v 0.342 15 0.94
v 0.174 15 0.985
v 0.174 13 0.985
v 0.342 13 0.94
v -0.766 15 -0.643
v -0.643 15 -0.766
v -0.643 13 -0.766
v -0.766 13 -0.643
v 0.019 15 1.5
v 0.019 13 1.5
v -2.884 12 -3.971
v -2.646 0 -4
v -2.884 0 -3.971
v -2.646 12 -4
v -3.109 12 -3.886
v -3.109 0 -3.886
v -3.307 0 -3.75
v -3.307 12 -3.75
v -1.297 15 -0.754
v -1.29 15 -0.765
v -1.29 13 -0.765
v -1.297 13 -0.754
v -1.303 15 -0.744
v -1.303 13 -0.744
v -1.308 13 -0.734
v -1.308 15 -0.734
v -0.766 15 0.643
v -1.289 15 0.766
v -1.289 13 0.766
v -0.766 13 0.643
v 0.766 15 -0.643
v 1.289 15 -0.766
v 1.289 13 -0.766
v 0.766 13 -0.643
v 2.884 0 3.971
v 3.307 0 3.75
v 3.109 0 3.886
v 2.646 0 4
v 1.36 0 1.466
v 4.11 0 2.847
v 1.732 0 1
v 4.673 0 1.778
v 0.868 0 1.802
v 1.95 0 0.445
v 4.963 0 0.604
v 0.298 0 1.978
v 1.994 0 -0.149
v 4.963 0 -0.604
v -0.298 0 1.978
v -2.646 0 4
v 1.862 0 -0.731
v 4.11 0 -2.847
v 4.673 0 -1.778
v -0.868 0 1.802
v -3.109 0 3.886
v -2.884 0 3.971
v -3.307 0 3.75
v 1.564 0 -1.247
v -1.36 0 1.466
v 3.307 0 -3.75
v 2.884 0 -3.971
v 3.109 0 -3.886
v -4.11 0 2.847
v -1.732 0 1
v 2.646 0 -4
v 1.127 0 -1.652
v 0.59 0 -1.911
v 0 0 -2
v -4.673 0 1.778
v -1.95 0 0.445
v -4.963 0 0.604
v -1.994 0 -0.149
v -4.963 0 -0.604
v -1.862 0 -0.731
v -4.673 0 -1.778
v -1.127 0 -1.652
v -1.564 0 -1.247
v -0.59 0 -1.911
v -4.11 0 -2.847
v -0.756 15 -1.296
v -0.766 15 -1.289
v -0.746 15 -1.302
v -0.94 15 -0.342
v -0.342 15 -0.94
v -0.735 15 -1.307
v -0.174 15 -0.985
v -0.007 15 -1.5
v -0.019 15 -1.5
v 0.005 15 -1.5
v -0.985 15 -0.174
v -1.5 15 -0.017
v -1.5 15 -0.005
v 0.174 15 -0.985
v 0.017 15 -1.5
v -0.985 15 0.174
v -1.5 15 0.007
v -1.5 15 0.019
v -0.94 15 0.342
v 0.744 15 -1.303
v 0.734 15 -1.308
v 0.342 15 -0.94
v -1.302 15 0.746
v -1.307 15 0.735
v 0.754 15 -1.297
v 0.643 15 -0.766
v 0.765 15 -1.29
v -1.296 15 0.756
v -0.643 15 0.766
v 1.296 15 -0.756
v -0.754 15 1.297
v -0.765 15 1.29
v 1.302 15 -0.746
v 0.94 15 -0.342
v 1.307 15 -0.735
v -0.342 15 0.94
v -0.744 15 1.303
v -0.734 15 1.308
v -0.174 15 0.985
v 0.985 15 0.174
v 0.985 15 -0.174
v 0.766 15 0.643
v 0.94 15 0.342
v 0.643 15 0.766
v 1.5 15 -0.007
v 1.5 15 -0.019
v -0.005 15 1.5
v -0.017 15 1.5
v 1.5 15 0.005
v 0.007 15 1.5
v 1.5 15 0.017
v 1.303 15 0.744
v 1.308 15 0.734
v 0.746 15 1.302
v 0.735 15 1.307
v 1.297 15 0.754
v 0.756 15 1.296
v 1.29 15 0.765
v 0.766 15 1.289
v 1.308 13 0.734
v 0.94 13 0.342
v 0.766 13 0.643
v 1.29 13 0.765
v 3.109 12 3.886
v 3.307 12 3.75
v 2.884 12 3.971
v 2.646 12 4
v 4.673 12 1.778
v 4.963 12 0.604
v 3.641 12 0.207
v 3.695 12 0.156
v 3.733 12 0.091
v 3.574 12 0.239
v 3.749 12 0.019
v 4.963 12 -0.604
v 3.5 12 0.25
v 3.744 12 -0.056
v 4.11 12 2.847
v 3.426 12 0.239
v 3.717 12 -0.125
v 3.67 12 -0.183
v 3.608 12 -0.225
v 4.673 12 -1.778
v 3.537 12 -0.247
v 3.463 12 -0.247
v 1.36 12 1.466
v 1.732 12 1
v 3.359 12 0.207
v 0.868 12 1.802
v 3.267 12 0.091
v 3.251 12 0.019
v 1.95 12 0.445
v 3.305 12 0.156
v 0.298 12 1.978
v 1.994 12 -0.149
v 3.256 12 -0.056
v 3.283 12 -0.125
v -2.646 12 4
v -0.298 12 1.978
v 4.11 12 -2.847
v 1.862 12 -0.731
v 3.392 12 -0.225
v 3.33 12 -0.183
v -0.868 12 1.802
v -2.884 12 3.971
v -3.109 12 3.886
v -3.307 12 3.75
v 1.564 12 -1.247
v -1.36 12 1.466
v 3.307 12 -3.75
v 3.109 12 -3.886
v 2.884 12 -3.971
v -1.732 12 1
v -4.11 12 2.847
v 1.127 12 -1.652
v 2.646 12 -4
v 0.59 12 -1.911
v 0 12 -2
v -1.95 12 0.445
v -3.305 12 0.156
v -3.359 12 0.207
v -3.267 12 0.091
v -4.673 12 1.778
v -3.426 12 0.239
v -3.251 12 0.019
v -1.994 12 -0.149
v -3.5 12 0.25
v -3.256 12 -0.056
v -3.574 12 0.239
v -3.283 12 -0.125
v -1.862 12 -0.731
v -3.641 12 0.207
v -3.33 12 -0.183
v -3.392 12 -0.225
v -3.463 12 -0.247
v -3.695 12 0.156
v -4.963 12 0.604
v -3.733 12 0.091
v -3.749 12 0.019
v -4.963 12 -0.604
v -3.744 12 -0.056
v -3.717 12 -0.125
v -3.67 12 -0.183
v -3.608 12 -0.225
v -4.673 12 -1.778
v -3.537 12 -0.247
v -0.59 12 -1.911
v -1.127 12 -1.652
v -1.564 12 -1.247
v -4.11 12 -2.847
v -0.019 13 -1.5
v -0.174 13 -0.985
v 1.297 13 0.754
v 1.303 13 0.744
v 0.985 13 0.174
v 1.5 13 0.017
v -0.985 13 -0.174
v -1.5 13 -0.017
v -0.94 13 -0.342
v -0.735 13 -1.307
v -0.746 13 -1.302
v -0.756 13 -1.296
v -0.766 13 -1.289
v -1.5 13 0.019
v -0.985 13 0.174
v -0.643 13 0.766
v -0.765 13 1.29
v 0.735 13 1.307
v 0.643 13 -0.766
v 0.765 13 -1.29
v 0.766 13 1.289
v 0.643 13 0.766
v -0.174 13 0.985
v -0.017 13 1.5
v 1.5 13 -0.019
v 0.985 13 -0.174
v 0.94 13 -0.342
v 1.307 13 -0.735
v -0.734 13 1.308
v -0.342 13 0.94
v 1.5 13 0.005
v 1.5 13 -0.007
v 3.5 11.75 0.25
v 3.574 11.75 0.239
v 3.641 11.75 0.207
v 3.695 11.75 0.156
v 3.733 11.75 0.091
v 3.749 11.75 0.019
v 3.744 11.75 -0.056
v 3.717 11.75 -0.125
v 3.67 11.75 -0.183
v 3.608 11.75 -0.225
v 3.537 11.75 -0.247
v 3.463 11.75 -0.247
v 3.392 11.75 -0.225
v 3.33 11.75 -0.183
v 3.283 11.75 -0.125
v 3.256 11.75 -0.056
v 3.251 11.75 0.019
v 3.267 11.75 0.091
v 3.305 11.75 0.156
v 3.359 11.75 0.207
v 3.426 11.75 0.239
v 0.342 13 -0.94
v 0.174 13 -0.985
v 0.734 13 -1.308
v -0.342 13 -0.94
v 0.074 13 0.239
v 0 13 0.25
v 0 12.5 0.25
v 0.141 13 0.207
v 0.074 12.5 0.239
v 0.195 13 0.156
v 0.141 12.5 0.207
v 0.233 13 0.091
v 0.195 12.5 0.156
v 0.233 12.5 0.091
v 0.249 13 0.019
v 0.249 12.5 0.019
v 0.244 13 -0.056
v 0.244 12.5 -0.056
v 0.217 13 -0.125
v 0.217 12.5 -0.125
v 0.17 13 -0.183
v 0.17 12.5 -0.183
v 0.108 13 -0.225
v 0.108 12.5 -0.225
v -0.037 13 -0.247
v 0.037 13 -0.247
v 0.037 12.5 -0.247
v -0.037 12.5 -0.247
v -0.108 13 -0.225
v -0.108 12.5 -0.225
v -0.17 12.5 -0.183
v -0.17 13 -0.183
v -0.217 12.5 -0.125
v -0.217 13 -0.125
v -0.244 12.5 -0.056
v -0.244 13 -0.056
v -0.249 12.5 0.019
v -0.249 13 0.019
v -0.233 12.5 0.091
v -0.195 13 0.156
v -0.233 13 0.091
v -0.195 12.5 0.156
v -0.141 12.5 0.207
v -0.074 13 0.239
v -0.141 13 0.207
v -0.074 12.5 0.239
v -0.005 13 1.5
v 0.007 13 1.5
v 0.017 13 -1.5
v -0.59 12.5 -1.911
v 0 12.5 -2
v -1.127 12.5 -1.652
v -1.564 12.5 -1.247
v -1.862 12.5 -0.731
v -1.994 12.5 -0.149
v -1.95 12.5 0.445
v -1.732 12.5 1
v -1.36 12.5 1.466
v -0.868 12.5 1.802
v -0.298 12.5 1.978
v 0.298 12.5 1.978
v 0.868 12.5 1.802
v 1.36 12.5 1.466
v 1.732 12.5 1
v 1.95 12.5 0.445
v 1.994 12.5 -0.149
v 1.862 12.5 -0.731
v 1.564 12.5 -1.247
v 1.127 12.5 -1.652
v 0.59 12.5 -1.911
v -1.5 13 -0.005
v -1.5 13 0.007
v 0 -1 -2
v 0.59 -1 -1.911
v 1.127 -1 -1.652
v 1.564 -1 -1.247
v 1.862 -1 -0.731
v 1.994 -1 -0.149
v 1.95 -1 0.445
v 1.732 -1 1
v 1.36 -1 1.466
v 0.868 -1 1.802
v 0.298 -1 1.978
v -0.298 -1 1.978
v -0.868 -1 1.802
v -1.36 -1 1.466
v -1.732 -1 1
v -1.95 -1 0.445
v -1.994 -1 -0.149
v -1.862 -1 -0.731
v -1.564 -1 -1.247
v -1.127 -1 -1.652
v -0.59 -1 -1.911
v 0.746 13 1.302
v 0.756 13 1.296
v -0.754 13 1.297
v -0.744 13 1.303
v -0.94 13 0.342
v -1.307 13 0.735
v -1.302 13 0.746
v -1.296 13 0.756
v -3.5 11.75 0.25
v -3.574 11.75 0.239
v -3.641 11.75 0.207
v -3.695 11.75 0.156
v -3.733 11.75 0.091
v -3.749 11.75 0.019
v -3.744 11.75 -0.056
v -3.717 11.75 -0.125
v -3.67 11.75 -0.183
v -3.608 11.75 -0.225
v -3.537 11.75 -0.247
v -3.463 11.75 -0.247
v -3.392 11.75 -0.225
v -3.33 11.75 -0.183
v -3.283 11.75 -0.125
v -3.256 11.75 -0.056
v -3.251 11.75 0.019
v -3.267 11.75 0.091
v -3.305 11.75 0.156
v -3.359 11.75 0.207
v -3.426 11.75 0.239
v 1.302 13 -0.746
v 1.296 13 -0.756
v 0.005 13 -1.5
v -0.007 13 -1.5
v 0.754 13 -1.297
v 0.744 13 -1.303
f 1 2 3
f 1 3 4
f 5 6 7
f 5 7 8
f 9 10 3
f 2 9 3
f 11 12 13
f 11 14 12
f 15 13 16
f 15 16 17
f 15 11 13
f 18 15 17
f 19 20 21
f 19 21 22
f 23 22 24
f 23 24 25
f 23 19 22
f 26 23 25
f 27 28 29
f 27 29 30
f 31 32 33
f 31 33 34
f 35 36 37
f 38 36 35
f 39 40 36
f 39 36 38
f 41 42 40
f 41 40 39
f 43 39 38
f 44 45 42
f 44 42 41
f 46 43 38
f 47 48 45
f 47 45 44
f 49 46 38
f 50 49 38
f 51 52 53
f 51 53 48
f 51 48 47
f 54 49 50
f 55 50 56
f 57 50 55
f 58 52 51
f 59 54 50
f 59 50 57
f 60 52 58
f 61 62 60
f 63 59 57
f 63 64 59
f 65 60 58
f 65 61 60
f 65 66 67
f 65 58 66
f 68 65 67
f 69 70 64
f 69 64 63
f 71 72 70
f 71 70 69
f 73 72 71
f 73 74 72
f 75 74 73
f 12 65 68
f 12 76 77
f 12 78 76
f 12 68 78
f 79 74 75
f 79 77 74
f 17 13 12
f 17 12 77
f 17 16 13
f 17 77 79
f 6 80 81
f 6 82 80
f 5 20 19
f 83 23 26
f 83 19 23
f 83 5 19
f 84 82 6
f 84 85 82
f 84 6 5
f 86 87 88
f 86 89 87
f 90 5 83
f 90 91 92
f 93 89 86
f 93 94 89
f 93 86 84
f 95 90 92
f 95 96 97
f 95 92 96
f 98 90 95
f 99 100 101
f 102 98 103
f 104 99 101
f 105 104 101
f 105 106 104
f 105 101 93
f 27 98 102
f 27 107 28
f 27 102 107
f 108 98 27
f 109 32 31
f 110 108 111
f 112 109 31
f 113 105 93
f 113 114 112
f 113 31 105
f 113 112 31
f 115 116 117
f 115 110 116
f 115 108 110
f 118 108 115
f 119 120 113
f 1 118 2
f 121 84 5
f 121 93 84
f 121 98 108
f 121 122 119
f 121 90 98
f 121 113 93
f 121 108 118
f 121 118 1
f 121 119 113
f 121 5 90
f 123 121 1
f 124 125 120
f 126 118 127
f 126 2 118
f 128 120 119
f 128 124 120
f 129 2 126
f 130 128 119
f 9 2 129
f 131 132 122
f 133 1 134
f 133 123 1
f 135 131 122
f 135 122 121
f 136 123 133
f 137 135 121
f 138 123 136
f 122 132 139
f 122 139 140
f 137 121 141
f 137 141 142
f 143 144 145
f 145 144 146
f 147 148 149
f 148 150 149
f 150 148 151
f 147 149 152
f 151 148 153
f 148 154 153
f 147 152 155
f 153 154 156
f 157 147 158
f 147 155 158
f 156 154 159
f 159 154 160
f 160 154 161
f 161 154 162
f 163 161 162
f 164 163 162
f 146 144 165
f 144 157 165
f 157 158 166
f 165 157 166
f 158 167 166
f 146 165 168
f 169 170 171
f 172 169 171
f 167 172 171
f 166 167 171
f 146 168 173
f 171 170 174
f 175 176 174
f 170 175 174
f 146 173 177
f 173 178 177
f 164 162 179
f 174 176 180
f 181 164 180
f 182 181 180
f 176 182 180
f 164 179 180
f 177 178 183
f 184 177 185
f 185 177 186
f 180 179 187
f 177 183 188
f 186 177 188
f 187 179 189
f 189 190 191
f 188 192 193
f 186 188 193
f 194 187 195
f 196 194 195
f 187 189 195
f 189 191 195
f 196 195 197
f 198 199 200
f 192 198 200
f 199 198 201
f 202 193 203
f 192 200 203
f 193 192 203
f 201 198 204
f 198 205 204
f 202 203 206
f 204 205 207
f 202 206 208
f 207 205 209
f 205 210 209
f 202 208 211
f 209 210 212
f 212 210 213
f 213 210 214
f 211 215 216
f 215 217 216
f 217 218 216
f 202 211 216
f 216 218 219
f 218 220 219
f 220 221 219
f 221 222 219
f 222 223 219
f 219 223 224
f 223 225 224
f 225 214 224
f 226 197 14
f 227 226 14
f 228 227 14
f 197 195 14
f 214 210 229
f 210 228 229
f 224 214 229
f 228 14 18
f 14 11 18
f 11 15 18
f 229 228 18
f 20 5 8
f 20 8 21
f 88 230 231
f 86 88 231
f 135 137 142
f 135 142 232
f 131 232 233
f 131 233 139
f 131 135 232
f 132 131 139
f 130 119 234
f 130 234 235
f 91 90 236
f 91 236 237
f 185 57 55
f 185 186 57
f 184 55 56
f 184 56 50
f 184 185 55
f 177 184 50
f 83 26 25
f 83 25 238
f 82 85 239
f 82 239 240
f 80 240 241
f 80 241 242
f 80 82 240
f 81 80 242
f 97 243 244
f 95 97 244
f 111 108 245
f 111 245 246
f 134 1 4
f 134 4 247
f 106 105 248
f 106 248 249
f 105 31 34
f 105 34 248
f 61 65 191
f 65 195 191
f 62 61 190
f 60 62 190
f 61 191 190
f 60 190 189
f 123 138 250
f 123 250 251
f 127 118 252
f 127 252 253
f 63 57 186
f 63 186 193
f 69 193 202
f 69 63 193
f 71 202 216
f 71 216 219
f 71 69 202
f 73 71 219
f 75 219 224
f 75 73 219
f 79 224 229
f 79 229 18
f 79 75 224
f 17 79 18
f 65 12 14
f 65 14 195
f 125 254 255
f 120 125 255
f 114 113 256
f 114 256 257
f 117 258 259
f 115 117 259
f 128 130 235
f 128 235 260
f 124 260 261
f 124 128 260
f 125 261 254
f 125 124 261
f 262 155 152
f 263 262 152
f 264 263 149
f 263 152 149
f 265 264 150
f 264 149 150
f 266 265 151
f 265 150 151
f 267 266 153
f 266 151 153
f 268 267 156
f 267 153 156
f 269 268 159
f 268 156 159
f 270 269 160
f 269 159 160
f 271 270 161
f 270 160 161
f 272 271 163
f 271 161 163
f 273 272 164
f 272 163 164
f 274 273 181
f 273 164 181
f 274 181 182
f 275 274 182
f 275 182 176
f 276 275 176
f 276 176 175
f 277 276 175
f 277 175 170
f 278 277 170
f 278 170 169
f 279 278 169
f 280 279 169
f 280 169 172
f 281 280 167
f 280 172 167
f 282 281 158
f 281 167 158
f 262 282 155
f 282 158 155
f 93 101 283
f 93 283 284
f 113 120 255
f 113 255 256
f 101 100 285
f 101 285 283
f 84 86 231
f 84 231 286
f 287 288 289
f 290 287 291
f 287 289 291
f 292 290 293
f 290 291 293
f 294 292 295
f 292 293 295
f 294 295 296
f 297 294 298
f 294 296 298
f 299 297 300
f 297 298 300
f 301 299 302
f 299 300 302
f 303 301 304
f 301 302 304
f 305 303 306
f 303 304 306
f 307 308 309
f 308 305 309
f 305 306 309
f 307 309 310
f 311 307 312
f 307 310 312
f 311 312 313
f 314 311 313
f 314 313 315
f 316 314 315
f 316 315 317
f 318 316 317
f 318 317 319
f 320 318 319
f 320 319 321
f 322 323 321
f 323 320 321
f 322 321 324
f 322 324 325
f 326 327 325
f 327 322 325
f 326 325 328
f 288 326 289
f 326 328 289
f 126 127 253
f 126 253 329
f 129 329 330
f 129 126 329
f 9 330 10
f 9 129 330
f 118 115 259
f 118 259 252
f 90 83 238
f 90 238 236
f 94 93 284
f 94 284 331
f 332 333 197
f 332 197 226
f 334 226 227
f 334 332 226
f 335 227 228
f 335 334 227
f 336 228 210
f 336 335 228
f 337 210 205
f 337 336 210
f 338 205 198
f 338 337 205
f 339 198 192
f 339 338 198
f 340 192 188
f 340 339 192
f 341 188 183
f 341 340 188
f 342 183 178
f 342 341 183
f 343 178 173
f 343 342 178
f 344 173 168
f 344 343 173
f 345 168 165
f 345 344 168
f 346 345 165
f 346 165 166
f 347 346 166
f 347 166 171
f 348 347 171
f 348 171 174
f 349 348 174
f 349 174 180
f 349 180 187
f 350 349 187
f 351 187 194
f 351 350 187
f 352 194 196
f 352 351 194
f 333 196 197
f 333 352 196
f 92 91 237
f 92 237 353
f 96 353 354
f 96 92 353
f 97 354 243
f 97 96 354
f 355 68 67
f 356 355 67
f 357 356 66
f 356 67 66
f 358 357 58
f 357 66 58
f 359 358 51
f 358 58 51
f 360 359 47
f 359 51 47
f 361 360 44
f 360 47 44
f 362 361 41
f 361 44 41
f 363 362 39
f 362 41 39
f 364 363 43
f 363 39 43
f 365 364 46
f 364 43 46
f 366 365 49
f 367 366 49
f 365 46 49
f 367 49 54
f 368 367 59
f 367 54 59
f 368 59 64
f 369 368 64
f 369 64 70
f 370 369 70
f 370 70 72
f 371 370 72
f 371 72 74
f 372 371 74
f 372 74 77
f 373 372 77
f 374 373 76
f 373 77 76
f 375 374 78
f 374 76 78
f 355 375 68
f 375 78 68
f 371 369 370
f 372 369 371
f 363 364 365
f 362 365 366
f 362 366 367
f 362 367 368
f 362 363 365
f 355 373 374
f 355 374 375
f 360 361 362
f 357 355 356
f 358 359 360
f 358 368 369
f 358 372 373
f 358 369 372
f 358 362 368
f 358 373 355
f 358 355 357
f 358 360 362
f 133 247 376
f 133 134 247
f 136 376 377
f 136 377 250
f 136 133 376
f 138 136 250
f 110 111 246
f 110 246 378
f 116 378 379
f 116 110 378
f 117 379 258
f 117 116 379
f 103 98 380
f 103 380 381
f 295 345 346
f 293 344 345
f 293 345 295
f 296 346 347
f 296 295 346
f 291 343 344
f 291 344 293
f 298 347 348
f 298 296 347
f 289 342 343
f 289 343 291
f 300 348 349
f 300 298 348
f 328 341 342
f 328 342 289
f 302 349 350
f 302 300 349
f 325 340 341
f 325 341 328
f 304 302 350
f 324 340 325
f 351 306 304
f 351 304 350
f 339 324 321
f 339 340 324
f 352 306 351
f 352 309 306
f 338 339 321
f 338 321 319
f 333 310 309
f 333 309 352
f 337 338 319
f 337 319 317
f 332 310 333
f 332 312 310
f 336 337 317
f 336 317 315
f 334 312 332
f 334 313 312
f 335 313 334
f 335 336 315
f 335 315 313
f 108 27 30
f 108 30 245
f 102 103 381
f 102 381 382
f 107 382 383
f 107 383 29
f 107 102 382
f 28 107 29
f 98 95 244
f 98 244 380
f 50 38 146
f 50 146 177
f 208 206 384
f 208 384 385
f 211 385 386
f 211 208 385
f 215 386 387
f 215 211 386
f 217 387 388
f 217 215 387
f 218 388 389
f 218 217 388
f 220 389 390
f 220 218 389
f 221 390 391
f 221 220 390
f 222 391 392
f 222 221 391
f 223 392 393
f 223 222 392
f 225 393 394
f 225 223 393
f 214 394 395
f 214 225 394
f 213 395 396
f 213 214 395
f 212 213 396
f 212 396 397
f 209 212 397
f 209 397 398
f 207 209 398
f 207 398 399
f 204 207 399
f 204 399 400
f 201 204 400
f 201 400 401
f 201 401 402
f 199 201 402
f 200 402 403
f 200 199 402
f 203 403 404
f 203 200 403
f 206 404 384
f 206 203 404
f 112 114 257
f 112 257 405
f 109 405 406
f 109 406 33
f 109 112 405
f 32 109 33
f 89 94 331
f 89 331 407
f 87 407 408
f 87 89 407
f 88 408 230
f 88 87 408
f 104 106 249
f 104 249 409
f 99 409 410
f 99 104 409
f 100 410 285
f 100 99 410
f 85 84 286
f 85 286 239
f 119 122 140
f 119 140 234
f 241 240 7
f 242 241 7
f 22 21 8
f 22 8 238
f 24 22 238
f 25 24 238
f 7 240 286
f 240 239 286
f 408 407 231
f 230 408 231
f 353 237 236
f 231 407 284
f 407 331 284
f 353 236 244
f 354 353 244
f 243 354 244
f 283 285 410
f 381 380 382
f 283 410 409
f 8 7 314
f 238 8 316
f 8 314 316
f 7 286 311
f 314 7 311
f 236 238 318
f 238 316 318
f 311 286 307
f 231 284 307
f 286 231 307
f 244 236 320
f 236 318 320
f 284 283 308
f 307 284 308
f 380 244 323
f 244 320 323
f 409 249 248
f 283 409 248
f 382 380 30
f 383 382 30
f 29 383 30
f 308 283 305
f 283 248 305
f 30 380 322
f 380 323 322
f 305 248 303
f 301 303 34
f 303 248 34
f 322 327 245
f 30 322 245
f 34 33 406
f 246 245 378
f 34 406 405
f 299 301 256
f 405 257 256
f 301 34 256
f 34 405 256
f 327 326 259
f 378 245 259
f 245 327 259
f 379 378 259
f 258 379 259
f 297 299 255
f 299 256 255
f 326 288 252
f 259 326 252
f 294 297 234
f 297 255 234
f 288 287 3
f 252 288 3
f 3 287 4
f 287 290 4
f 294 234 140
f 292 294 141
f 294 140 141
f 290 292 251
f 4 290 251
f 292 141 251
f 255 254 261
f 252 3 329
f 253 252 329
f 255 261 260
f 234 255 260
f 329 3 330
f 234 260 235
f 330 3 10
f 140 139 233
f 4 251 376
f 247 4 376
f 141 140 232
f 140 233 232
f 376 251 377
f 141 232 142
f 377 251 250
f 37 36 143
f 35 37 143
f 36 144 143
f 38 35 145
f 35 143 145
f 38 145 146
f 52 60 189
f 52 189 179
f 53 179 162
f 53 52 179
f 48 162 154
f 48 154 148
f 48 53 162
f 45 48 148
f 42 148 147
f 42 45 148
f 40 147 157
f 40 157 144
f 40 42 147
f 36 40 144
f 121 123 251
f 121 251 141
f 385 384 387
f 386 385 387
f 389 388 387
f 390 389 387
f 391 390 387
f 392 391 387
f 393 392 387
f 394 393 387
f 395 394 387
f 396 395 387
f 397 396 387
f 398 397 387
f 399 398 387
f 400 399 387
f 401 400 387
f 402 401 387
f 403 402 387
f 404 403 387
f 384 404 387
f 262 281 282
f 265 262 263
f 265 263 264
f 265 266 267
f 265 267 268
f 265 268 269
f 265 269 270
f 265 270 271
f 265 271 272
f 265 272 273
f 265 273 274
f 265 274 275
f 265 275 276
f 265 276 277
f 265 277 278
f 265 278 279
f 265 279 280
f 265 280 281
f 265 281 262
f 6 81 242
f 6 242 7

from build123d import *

# Parameters (mm, degrees)
BOSS_EXTRUDE1_DEPTH = 12
SKETCH3_R           = 2
BOSS_EXTRUDE2_DEPTH = 1
FILLET3_R           = 1
BOSS_EXTRUDE3_START = 0.5
SKETCH4_R           = 2
BOSS_EXTRUDE3_DEPTH = 0.5
SKETCH5_R           = 0.25
CUT_EXTRUDE1_DEPTH  = 0.25
SKETCH6_R           = 0.25
BOSS_EXTRUDE4_DEPTH = 2.5
SKETCH7_R           = 1.5
BOSS_EXTRUDE5_DEPTH = 2
CUT_EXTRUDE11_DEPTH = 2
CIRPATTERN2_COUNT   = 12


with BuildPart() as part:
    # Sketch2 → Boss-Extrude1 (new body)
    with BuildSketch(Plane(origin=(0, 0, 0), x_dir=(1, 0, 0), z_dir=(0, 1, 0))):
        with BuildLine():
            Line((-3, 4), (3, 4))
            ThreePointArc((3, 4), (5, 0), (3, -4))
            Line((3, -4), (-3, -4))
            ThreePointArc((-3, -4), (-5, 0), (-3, 4))
        make_face()
    extrude(amount=BOSS_EXTRUDE1_DEPTH)

    # Sketch3 → Boss-Extrude2 (add)
    with BuildSketch(Plane(origin=(0, 0, 0), x_dir=(-1, 0, 0), z_dir=(0, -1, 0))):
        with Locations(Location((0, 0, 0), (0, 0, 90))):
            Circle(SKETCH3_R)
    extrude(amount=BOSS_EXTRUDE2_DEPTH)

    # Fillet3
    fillet3_edges = [part.edges().sort_by_distance(p)[0] for p in [
        (-3, 6, -4),
        (3, 6, -4),
        (3, 6, 4),
        (-3, 6, 4),
    ]]
    fillet(fillet3_edges, radius=FILLET3_R)

    # Sketch4 → Boss-Extrude3 (add)
    with BuildSketch(Plane(origin=(0, 12, 0), x_dir=(1, 0, 0), z_dir=(0, 1, 0)).offset(BOSS_EXTRUDE3_START)):
        with Locations(Location((0, 0, 0), (0, 0, 90))):
            Circle(SKETCH4_R)
    extrude(amount=-BOSS_EXTRUDE3_DEPTH)

    # Sketch5 → Cut-Extrude1 (cut)
    with BuildSketch(Plane(origin=(0, 12, 0), x_dir=(1, 0, 0), z_dir=(0, 1, 0))):
        with Locations(Location((3.5, 0, 0), (0, 0, 270))):
            Circle(SKETCH5_R)
    cut_extrude1 = extrude(amount=-CUT_EXTRUDE1_DEPTH, mode=Mode.SUBTRACT)

    # Mirror1: Cut-Extrude1 across plane
    add(cut_extrude1.mirror(Plane(origin=(0, 0, 0), x_dir=(0, 0, 1), z_dir=(1, 0, 0))), mode=Mode.SUBTRACT)

    # Sketch6 → Boss-Extrude4 (add)
    with BuildSketch(Plane(origin=(0, 12.5, 0), x_dir=(1, 0, 0), z_dir=(0, 1, 0))):
        with Locations(Location((0, 0, 0), (0, 0, 270))):
            Circle(SKETCH6_R)
    extrude(amount=BOSS_EXTRUDE4_DEPTH)

    # Sketch7 → Boss-Extrude5 (add)
    with BuildSketch(Plane(origin=(0, 15, 0), x_dir=(1, 0, 0), z_dir=(0, 1, 0))):
        with Locations(Location((0, 0, 0), (0, 0, 270))):
            Circle(SKETCH7_R)
    extrude(amount=-BOSS_EXTRUDE5_DEPTH)

    # Sketch9 → Cut-Extrude11 (cut)
    with BuildSketch(Plane(origin=(0, 15, 0), x_dir=(1, 0, 0), z_dir=(0, 1, 0))):
        Polygon((-0.342020143, -0.939692621), (-0.173648178, -0.984807753), (0, -1.556082509), (-0.781544676, -1.353675088), align=None)
    cut_extrude11 = extrude(amount=-CUT_EXTRUDE11_DEPTH, mode=Mode.SUBTRACT)

    # CirPattern2: Cut-Extrude11 ×12 about axis
    cirpattern2_axis = Axis((0, 0, 0), (0, 1, 0))
    for i in range(1, CIRPATTERN2_COUNT):
        add(cut_extrude11.rotate(cirpattern2_axis, i * 360 / CIRPATTERN2_COUNT), mode=Mode.SUBTRACT)


solid = part.part
